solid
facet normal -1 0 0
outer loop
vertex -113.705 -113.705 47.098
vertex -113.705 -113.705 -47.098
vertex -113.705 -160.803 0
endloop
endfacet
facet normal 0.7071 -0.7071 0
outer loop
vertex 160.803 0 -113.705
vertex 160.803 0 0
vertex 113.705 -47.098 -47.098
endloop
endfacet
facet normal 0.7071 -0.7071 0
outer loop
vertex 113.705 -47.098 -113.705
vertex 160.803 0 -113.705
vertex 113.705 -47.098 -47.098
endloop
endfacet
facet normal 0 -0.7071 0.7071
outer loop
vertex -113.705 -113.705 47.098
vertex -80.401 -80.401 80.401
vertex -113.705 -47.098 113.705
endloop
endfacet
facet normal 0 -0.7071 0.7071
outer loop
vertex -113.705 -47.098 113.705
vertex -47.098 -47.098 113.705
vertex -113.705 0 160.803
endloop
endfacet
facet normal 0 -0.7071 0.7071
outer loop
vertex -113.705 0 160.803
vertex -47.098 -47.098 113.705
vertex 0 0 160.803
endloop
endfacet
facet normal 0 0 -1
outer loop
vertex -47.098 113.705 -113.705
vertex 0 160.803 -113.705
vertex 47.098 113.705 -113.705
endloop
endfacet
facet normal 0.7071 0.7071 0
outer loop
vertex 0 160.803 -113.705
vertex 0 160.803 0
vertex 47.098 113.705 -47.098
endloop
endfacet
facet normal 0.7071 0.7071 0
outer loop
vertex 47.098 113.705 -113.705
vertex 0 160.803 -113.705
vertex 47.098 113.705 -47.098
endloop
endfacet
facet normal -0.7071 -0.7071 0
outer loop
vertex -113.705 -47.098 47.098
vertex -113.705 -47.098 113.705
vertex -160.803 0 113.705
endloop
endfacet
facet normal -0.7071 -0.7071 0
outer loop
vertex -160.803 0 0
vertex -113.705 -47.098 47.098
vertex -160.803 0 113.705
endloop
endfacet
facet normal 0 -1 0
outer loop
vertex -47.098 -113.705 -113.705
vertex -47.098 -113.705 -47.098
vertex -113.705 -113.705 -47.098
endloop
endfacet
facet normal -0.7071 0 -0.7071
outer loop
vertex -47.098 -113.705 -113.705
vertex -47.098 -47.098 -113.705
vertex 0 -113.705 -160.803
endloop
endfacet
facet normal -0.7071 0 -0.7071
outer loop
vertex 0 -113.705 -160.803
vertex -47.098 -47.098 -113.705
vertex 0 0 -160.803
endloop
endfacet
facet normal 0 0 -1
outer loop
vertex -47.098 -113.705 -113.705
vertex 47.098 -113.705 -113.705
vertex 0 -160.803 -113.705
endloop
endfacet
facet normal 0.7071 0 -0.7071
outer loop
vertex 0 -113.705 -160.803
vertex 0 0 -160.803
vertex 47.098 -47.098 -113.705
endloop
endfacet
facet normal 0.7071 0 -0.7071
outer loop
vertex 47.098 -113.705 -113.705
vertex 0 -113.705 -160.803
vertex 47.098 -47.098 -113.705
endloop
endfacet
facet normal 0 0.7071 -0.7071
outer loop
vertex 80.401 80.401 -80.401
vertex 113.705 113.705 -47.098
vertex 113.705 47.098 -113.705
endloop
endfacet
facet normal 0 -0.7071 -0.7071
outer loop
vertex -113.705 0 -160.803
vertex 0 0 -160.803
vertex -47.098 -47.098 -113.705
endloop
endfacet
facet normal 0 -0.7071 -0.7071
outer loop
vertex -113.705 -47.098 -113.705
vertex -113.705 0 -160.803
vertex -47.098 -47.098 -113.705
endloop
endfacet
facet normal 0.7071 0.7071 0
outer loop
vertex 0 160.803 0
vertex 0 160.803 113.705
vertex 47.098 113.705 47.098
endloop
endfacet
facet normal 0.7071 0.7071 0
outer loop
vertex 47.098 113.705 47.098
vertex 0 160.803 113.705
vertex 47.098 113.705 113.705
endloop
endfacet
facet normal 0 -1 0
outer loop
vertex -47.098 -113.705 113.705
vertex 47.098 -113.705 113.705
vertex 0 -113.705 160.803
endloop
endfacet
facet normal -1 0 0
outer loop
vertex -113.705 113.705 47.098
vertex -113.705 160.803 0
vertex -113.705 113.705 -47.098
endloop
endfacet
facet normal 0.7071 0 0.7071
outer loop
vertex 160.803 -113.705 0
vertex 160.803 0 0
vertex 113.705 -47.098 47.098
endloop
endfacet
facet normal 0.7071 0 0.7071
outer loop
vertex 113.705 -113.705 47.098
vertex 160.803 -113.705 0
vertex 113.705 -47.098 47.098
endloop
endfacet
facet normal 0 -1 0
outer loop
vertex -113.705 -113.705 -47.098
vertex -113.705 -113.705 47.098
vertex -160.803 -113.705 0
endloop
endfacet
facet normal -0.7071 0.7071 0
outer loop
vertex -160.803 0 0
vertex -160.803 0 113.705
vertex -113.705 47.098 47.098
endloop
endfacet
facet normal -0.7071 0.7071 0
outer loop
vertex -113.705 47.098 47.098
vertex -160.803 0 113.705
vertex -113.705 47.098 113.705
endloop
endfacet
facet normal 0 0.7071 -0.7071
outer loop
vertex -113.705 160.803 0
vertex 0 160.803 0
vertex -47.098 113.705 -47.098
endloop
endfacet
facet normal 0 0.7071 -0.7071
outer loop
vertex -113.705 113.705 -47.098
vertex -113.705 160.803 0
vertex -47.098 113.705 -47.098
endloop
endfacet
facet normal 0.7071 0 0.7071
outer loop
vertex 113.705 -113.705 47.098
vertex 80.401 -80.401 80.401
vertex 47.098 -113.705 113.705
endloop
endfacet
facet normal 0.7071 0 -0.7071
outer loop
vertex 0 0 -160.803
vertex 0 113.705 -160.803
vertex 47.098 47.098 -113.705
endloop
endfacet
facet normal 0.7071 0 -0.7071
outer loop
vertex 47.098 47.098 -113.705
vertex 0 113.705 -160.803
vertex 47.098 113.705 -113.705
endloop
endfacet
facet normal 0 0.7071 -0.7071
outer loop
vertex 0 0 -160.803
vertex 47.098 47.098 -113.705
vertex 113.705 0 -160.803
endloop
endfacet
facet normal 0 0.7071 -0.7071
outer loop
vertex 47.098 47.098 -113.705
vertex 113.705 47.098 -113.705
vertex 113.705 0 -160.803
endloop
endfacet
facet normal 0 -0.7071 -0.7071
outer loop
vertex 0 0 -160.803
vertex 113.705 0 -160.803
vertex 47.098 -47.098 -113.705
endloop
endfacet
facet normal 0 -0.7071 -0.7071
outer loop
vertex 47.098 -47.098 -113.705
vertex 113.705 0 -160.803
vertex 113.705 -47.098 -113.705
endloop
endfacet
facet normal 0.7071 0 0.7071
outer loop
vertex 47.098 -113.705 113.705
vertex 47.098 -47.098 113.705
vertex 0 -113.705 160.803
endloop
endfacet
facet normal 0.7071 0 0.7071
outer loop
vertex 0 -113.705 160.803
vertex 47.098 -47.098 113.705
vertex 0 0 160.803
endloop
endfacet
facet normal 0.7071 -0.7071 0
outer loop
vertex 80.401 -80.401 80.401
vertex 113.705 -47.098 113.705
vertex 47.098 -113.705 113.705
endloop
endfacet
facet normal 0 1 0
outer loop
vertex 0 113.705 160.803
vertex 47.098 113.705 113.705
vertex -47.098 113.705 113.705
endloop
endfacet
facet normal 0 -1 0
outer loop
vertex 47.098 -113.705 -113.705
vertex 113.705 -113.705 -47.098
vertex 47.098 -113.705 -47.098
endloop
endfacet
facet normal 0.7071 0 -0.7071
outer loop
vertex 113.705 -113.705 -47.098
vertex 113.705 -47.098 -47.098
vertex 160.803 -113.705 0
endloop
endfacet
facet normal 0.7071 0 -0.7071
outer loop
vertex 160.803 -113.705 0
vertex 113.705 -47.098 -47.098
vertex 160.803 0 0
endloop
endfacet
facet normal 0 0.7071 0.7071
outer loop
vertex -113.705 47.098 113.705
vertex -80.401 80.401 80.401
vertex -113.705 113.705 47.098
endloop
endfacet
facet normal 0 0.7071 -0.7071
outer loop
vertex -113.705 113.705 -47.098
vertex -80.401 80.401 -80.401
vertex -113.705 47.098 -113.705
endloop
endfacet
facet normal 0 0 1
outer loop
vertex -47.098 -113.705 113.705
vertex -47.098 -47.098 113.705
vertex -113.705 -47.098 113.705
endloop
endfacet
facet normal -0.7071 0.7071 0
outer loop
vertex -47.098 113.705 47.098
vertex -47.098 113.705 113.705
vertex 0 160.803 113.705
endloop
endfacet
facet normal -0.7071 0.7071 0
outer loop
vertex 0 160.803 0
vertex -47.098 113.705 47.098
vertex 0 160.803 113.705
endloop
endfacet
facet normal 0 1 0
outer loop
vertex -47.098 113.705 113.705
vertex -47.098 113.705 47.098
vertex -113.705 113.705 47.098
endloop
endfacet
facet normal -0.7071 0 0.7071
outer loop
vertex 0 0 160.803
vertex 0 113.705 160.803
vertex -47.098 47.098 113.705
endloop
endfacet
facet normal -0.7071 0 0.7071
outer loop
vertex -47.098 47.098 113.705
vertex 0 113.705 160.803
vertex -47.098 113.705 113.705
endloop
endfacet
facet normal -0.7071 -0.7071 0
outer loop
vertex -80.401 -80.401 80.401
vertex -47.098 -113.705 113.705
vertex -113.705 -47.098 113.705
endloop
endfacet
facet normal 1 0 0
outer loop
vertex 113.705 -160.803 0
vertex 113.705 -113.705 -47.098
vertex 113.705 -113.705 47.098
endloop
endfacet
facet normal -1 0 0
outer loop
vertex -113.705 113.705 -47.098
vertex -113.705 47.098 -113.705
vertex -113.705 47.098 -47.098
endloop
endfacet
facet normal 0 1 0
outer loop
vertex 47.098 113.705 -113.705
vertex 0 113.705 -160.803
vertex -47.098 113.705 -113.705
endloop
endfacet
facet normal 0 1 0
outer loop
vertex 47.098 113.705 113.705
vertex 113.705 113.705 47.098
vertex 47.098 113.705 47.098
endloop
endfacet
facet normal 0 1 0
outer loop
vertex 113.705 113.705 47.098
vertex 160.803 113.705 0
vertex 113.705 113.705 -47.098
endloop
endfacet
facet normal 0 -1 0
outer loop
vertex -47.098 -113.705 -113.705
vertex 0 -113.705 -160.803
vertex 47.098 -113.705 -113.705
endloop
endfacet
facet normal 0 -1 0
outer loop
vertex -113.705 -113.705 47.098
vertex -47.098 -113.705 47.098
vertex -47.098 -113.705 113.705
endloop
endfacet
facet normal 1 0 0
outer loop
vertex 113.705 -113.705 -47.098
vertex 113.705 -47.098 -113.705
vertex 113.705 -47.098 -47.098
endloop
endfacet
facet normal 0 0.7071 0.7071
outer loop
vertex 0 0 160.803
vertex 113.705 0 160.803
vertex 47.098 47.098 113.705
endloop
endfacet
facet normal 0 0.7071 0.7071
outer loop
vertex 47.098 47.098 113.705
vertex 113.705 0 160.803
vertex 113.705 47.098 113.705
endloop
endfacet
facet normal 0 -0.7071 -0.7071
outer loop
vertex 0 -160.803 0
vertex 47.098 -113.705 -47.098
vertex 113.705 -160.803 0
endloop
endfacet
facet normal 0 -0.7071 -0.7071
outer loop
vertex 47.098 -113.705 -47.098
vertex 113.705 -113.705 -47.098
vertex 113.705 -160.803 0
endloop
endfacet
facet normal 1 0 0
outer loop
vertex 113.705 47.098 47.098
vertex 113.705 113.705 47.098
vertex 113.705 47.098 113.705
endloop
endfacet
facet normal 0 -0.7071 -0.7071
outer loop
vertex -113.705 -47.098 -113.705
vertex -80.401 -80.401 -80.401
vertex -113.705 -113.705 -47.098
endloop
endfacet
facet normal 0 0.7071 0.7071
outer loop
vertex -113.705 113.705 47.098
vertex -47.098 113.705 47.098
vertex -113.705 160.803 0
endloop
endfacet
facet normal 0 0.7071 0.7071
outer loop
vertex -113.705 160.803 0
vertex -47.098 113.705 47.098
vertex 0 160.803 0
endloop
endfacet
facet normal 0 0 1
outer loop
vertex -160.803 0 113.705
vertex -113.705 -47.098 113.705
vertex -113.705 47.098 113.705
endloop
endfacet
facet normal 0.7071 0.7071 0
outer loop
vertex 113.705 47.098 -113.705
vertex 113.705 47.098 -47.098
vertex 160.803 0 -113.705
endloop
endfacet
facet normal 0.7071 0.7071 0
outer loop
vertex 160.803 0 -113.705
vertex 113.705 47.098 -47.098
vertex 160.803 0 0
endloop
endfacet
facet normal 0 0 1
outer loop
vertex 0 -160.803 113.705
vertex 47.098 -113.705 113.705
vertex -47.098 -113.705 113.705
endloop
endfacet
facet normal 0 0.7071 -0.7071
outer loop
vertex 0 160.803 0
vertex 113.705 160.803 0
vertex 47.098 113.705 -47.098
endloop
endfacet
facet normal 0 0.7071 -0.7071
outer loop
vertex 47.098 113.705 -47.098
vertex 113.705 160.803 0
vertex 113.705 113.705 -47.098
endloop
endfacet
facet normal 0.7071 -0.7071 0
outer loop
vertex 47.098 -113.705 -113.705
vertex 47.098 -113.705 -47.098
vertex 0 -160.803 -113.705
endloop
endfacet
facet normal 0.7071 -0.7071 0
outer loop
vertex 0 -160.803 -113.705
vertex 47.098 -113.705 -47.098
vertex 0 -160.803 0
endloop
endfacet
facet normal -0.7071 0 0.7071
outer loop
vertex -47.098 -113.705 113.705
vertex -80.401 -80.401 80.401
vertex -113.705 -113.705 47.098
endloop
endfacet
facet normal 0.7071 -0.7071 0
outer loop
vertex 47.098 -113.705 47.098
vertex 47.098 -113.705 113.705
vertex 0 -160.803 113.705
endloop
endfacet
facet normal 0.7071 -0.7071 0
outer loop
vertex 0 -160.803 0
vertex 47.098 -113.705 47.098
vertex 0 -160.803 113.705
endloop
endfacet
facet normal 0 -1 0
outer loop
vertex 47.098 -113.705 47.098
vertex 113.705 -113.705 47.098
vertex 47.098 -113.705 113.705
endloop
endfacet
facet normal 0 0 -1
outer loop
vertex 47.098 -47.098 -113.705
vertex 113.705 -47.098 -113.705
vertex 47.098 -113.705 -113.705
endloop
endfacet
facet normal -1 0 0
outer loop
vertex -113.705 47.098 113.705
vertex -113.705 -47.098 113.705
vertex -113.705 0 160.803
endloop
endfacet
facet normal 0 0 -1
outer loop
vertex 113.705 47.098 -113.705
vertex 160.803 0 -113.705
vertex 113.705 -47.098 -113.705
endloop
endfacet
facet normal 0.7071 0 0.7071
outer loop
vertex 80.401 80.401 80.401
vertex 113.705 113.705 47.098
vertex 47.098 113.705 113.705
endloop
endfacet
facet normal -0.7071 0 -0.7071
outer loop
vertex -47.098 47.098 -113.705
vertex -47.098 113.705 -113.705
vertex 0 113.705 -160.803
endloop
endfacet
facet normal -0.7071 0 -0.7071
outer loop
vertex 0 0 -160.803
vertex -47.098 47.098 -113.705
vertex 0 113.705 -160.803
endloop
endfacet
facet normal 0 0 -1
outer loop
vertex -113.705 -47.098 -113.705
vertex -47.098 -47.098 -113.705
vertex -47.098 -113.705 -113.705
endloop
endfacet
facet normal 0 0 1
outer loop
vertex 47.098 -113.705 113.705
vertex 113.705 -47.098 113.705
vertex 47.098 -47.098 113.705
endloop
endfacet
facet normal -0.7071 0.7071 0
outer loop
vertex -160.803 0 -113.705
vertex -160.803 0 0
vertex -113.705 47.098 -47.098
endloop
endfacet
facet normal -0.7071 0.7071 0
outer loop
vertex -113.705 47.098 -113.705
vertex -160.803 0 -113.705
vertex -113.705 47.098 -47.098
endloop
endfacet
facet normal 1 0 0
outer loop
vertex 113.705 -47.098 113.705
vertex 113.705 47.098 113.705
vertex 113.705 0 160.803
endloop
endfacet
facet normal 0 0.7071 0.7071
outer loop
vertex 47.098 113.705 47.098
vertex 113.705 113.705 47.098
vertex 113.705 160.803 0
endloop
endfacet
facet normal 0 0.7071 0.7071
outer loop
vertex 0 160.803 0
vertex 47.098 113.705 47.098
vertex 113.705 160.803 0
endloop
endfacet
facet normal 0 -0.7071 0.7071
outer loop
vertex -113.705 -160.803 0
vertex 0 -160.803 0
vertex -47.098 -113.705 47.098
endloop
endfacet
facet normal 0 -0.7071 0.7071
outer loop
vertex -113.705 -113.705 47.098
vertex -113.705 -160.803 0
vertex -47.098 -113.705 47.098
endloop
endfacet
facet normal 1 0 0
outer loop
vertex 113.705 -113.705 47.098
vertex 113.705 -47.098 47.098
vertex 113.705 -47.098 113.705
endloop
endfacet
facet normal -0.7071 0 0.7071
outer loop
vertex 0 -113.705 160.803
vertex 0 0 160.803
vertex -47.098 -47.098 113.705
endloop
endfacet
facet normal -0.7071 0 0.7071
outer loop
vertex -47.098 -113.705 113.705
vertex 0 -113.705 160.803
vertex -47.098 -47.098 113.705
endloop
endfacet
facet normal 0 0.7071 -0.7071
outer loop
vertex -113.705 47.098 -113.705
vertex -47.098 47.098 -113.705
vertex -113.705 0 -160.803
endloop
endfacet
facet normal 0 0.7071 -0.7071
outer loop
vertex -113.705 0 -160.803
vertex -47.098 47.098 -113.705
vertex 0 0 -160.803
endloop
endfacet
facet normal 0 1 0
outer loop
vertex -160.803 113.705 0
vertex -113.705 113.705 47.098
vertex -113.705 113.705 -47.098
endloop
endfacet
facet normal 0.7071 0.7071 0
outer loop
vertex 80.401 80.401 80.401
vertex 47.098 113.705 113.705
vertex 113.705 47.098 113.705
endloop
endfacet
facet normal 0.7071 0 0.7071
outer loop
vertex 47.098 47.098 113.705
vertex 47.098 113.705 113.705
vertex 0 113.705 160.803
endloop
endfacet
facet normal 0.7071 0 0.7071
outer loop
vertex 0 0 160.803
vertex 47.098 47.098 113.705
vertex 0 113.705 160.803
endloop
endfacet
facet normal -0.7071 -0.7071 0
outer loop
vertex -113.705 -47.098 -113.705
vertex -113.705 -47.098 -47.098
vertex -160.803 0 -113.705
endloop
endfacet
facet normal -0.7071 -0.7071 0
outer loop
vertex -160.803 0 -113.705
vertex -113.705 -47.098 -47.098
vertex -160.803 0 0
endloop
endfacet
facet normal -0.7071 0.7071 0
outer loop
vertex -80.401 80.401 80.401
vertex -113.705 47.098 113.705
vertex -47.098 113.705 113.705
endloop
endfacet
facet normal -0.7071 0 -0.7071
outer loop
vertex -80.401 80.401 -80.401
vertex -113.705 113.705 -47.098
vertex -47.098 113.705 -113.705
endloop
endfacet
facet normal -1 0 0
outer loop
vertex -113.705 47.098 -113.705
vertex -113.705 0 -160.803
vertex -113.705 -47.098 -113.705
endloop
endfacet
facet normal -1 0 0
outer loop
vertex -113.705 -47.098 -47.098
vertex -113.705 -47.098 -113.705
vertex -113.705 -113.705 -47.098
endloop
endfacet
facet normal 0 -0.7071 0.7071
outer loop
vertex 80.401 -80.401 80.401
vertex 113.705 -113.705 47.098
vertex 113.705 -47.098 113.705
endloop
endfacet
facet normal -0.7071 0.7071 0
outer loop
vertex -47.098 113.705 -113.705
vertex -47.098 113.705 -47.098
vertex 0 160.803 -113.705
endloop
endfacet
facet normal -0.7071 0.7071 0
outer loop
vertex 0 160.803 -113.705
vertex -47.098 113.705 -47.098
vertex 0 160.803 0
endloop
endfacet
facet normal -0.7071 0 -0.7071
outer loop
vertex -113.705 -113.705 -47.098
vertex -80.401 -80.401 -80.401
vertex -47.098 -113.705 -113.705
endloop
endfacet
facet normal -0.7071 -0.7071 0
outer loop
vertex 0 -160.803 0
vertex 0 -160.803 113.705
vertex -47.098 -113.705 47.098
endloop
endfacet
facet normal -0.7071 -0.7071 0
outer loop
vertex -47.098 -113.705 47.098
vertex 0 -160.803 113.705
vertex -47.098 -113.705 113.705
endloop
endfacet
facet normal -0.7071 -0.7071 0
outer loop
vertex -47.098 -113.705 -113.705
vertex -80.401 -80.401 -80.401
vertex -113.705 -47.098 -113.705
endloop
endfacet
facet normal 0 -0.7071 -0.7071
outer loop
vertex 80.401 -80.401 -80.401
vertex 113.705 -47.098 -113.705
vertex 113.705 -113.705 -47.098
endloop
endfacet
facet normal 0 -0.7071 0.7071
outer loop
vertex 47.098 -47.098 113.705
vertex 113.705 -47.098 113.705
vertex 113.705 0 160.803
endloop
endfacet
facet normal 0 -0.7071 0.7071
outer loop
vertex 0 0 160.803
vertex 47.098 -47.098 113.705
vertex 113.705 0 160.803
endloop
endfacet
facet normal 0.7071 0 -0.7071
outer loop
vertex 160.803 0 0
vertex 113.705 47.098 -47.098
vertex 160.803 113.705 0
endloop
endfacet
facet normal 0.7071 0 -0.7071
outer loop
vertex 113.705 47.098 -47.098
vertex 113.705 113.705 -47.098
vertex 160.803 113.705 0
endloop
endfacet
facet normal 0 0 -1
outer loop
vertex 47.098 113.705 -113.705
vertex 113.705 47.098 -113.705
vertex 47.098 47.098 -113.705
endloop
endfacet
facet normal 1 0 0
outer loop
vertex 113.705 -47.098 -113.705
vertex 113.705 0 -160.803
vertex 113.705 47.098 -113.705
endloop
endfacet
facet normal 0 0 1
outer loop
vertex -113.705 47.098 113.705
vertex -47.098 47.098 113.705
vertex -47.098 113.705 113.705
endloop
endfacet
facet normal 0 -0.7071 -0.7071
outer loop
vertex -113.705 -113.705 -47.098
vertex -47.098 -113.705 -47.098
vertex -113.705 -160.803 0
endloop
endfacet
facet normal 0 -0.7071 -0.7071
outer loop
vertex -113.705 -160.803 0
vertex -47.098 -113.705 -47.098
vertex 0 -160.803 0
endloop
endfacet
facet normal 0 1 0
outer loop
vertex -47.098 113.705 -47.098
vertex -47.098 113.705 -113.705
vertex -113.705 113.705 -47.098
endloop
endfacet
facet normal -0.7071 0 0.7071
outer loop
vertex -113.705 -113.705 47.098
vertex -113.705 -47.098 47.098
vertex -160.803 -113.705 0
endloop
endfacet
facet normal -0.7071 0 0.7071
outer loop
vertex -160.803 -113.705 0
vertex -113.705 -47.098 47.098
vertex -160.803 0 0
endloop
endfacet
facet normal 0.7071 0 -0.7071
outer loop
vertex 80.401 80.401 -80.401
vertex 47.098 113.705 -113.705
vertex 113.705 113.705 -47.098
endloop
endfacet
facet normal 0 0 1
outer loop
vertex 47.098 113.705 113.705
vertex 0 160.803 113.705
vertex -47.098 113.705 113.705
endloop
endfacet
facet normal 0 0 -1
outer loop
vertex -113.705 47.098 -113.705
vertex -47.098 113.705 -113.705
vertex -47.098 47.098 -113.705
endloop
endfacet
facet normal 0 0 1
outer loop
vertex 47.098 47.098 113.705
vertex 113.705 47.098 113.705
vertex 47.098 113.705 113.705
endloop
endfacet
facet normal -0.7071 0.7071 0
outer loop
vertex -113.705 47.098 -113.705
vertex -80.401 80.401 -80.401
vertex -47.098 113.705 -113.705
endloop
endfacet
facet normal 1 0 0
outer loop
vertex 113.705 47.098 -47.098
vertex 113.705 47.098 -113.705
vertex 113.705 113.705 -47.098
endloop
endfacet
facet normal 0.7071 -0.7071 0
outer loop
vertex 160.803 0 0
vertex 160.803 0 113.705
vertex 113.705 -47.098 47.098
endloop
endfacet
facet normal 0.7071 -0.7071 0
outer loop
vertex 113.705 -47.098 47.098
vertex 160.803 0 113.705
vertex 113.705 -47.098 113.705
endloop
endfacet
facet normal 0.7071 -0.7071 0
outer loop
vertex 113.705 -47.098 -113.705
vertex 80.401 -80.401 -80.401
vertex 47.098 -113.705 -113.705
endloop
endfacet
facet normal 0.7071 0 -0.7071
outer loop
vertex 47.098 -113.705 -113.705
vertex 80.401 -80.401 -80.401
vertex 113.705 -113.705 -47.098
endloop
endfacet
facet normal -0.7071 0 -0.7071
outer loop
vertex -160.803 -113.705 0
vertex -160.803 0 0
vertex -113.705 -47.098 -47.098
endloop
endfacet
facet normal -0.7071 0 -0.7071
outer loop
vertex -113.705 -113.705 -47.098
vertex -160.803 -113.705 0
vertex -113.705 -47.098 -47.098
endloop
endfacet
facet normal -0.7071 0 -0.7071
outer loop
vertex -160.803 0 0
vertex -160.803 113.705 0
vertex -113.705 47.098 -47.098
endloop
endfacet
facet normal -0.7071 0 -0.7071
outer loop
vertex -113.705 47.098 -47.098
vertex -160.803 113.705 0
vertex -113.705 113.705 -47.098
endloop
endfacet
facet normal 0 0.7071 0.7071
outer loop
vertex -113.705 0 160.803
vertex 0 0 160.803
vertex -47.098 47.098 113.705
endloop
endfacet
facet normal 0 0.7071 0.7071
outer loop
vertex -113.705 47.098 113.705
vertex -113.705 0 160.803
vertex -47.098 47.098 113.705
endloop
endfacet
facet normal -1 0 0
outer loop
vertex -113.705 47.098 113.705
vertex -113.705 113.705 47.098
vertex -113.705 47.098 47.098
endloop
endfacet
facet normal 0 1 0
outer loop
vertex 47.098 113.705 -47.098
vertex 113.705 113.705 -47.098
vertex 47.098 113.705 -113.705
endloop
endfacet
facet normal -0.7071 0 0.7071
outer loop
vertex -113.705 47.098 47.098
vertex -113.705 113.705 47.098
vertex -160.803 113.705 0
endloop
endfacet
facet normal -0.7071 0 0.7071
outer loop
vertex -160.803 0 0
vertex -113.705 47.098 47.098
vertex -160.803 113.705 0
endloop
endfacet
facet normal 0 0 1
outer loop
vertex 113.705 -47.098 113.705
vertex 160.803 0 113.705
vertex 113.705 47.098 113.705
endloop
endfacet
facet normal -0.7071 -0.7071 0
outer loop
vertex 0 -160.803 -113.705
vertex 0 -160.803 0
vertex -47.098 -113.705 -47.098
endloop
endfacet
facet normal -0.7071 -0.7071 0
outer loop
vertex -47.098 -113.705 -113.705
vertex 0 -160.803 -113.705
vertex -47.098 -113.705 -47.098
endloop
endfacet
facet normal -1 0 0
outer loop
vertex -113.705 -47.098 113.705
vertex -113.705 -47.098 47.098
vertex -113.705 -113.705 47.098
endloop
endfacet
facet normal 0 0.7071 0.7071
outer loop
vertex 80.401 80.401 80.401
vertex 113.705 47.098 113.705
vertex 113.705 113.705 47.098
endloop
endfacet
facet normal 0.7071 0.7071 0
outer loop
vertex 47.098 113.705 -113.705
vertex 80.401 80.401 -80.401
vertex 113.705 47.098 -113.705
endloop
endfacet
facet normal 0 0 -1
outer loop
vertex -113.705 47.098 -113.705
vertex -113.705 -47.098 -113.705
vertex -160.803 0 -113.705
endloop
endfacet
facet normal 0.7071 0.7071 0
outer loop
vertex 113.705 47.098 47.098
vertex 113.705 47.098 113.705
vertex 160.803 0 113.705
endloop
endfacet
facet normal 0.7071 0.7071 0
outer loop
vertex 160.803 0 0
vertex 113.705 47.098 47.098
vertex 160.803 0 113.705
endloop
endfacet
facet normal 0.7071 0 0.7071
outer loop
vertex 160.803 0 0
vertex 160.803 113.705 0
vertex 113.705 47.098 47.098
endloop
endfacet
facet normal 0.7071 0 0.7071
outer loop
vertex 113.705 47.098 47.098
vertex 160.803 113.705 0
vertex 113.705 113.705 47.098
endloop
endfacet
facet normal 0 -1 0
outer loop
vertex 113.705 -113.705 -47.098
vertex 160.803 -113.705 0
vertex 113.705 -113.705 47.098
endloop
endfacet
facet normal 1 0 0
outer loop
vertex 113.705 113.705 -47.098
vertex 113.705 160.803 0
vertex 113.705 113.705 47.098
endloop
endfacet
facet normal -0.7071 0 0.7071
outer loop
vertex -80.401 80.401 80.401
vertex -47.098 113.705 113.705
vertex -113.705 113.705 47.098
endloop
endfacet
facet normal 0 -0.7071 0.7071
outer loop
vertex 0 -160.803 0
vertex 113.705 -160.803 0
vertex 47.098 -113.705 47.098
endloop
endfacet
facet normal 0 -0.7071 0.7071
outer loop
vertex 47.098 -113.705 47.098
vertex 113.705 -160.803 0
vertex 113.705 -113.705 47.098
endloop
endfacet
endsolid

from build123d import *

# Parameters (mm, degrees)
BOSS_EXTRUDE1_DEPTH = 113.704878
BOSS_EXTRUDE2_DEPTH = 113.704878
BOSS_EXTRUDE3_DEPTH = 113.704878


with BuildPart() as part:
    # Sketch3 → Boss-Extrude1 (new, symmetric)
    with BuildSketch(Plane.XY):
        Polygon((-160.802980576, 0), (0, 160.802980576), (160.802980576, 0), (0, -160.802980576), align=None)
    extrude(amount=BOSS_EXTRUDE1_DEPTH, both=True)

    # Sketch4 → Boss-Extrude2 (add, symmetric)
    with BuildSketch(Plane(origin=(0, 0, 0), x_dir=(1, 0, 0), z_dir=(0, 1, 0))):
        Polygon((-160.802980576, 0), (0, 160.802980576), (160.802980576, 0), (0, -160.802980576), align=None)
    extrude(amount=BOSS_EXTRUDE2_DEPTH, both=True)

    # Sketch5 → Boss-Extrude3 (add, symmetric)
    with BuildSketch(Plane(origin=(0, 0, 0), x_dir=(0, 0, -1), z_dir=(1, 0, 0))):
        Polygon((-160.802980576, 0), (0, 160.802980576), (160.802980576, 0), (0, -160.802980576), align=None)
    extrude(amount=BOSS_EXTRUDE3_DEPTH, both=True)


solid = part.part
